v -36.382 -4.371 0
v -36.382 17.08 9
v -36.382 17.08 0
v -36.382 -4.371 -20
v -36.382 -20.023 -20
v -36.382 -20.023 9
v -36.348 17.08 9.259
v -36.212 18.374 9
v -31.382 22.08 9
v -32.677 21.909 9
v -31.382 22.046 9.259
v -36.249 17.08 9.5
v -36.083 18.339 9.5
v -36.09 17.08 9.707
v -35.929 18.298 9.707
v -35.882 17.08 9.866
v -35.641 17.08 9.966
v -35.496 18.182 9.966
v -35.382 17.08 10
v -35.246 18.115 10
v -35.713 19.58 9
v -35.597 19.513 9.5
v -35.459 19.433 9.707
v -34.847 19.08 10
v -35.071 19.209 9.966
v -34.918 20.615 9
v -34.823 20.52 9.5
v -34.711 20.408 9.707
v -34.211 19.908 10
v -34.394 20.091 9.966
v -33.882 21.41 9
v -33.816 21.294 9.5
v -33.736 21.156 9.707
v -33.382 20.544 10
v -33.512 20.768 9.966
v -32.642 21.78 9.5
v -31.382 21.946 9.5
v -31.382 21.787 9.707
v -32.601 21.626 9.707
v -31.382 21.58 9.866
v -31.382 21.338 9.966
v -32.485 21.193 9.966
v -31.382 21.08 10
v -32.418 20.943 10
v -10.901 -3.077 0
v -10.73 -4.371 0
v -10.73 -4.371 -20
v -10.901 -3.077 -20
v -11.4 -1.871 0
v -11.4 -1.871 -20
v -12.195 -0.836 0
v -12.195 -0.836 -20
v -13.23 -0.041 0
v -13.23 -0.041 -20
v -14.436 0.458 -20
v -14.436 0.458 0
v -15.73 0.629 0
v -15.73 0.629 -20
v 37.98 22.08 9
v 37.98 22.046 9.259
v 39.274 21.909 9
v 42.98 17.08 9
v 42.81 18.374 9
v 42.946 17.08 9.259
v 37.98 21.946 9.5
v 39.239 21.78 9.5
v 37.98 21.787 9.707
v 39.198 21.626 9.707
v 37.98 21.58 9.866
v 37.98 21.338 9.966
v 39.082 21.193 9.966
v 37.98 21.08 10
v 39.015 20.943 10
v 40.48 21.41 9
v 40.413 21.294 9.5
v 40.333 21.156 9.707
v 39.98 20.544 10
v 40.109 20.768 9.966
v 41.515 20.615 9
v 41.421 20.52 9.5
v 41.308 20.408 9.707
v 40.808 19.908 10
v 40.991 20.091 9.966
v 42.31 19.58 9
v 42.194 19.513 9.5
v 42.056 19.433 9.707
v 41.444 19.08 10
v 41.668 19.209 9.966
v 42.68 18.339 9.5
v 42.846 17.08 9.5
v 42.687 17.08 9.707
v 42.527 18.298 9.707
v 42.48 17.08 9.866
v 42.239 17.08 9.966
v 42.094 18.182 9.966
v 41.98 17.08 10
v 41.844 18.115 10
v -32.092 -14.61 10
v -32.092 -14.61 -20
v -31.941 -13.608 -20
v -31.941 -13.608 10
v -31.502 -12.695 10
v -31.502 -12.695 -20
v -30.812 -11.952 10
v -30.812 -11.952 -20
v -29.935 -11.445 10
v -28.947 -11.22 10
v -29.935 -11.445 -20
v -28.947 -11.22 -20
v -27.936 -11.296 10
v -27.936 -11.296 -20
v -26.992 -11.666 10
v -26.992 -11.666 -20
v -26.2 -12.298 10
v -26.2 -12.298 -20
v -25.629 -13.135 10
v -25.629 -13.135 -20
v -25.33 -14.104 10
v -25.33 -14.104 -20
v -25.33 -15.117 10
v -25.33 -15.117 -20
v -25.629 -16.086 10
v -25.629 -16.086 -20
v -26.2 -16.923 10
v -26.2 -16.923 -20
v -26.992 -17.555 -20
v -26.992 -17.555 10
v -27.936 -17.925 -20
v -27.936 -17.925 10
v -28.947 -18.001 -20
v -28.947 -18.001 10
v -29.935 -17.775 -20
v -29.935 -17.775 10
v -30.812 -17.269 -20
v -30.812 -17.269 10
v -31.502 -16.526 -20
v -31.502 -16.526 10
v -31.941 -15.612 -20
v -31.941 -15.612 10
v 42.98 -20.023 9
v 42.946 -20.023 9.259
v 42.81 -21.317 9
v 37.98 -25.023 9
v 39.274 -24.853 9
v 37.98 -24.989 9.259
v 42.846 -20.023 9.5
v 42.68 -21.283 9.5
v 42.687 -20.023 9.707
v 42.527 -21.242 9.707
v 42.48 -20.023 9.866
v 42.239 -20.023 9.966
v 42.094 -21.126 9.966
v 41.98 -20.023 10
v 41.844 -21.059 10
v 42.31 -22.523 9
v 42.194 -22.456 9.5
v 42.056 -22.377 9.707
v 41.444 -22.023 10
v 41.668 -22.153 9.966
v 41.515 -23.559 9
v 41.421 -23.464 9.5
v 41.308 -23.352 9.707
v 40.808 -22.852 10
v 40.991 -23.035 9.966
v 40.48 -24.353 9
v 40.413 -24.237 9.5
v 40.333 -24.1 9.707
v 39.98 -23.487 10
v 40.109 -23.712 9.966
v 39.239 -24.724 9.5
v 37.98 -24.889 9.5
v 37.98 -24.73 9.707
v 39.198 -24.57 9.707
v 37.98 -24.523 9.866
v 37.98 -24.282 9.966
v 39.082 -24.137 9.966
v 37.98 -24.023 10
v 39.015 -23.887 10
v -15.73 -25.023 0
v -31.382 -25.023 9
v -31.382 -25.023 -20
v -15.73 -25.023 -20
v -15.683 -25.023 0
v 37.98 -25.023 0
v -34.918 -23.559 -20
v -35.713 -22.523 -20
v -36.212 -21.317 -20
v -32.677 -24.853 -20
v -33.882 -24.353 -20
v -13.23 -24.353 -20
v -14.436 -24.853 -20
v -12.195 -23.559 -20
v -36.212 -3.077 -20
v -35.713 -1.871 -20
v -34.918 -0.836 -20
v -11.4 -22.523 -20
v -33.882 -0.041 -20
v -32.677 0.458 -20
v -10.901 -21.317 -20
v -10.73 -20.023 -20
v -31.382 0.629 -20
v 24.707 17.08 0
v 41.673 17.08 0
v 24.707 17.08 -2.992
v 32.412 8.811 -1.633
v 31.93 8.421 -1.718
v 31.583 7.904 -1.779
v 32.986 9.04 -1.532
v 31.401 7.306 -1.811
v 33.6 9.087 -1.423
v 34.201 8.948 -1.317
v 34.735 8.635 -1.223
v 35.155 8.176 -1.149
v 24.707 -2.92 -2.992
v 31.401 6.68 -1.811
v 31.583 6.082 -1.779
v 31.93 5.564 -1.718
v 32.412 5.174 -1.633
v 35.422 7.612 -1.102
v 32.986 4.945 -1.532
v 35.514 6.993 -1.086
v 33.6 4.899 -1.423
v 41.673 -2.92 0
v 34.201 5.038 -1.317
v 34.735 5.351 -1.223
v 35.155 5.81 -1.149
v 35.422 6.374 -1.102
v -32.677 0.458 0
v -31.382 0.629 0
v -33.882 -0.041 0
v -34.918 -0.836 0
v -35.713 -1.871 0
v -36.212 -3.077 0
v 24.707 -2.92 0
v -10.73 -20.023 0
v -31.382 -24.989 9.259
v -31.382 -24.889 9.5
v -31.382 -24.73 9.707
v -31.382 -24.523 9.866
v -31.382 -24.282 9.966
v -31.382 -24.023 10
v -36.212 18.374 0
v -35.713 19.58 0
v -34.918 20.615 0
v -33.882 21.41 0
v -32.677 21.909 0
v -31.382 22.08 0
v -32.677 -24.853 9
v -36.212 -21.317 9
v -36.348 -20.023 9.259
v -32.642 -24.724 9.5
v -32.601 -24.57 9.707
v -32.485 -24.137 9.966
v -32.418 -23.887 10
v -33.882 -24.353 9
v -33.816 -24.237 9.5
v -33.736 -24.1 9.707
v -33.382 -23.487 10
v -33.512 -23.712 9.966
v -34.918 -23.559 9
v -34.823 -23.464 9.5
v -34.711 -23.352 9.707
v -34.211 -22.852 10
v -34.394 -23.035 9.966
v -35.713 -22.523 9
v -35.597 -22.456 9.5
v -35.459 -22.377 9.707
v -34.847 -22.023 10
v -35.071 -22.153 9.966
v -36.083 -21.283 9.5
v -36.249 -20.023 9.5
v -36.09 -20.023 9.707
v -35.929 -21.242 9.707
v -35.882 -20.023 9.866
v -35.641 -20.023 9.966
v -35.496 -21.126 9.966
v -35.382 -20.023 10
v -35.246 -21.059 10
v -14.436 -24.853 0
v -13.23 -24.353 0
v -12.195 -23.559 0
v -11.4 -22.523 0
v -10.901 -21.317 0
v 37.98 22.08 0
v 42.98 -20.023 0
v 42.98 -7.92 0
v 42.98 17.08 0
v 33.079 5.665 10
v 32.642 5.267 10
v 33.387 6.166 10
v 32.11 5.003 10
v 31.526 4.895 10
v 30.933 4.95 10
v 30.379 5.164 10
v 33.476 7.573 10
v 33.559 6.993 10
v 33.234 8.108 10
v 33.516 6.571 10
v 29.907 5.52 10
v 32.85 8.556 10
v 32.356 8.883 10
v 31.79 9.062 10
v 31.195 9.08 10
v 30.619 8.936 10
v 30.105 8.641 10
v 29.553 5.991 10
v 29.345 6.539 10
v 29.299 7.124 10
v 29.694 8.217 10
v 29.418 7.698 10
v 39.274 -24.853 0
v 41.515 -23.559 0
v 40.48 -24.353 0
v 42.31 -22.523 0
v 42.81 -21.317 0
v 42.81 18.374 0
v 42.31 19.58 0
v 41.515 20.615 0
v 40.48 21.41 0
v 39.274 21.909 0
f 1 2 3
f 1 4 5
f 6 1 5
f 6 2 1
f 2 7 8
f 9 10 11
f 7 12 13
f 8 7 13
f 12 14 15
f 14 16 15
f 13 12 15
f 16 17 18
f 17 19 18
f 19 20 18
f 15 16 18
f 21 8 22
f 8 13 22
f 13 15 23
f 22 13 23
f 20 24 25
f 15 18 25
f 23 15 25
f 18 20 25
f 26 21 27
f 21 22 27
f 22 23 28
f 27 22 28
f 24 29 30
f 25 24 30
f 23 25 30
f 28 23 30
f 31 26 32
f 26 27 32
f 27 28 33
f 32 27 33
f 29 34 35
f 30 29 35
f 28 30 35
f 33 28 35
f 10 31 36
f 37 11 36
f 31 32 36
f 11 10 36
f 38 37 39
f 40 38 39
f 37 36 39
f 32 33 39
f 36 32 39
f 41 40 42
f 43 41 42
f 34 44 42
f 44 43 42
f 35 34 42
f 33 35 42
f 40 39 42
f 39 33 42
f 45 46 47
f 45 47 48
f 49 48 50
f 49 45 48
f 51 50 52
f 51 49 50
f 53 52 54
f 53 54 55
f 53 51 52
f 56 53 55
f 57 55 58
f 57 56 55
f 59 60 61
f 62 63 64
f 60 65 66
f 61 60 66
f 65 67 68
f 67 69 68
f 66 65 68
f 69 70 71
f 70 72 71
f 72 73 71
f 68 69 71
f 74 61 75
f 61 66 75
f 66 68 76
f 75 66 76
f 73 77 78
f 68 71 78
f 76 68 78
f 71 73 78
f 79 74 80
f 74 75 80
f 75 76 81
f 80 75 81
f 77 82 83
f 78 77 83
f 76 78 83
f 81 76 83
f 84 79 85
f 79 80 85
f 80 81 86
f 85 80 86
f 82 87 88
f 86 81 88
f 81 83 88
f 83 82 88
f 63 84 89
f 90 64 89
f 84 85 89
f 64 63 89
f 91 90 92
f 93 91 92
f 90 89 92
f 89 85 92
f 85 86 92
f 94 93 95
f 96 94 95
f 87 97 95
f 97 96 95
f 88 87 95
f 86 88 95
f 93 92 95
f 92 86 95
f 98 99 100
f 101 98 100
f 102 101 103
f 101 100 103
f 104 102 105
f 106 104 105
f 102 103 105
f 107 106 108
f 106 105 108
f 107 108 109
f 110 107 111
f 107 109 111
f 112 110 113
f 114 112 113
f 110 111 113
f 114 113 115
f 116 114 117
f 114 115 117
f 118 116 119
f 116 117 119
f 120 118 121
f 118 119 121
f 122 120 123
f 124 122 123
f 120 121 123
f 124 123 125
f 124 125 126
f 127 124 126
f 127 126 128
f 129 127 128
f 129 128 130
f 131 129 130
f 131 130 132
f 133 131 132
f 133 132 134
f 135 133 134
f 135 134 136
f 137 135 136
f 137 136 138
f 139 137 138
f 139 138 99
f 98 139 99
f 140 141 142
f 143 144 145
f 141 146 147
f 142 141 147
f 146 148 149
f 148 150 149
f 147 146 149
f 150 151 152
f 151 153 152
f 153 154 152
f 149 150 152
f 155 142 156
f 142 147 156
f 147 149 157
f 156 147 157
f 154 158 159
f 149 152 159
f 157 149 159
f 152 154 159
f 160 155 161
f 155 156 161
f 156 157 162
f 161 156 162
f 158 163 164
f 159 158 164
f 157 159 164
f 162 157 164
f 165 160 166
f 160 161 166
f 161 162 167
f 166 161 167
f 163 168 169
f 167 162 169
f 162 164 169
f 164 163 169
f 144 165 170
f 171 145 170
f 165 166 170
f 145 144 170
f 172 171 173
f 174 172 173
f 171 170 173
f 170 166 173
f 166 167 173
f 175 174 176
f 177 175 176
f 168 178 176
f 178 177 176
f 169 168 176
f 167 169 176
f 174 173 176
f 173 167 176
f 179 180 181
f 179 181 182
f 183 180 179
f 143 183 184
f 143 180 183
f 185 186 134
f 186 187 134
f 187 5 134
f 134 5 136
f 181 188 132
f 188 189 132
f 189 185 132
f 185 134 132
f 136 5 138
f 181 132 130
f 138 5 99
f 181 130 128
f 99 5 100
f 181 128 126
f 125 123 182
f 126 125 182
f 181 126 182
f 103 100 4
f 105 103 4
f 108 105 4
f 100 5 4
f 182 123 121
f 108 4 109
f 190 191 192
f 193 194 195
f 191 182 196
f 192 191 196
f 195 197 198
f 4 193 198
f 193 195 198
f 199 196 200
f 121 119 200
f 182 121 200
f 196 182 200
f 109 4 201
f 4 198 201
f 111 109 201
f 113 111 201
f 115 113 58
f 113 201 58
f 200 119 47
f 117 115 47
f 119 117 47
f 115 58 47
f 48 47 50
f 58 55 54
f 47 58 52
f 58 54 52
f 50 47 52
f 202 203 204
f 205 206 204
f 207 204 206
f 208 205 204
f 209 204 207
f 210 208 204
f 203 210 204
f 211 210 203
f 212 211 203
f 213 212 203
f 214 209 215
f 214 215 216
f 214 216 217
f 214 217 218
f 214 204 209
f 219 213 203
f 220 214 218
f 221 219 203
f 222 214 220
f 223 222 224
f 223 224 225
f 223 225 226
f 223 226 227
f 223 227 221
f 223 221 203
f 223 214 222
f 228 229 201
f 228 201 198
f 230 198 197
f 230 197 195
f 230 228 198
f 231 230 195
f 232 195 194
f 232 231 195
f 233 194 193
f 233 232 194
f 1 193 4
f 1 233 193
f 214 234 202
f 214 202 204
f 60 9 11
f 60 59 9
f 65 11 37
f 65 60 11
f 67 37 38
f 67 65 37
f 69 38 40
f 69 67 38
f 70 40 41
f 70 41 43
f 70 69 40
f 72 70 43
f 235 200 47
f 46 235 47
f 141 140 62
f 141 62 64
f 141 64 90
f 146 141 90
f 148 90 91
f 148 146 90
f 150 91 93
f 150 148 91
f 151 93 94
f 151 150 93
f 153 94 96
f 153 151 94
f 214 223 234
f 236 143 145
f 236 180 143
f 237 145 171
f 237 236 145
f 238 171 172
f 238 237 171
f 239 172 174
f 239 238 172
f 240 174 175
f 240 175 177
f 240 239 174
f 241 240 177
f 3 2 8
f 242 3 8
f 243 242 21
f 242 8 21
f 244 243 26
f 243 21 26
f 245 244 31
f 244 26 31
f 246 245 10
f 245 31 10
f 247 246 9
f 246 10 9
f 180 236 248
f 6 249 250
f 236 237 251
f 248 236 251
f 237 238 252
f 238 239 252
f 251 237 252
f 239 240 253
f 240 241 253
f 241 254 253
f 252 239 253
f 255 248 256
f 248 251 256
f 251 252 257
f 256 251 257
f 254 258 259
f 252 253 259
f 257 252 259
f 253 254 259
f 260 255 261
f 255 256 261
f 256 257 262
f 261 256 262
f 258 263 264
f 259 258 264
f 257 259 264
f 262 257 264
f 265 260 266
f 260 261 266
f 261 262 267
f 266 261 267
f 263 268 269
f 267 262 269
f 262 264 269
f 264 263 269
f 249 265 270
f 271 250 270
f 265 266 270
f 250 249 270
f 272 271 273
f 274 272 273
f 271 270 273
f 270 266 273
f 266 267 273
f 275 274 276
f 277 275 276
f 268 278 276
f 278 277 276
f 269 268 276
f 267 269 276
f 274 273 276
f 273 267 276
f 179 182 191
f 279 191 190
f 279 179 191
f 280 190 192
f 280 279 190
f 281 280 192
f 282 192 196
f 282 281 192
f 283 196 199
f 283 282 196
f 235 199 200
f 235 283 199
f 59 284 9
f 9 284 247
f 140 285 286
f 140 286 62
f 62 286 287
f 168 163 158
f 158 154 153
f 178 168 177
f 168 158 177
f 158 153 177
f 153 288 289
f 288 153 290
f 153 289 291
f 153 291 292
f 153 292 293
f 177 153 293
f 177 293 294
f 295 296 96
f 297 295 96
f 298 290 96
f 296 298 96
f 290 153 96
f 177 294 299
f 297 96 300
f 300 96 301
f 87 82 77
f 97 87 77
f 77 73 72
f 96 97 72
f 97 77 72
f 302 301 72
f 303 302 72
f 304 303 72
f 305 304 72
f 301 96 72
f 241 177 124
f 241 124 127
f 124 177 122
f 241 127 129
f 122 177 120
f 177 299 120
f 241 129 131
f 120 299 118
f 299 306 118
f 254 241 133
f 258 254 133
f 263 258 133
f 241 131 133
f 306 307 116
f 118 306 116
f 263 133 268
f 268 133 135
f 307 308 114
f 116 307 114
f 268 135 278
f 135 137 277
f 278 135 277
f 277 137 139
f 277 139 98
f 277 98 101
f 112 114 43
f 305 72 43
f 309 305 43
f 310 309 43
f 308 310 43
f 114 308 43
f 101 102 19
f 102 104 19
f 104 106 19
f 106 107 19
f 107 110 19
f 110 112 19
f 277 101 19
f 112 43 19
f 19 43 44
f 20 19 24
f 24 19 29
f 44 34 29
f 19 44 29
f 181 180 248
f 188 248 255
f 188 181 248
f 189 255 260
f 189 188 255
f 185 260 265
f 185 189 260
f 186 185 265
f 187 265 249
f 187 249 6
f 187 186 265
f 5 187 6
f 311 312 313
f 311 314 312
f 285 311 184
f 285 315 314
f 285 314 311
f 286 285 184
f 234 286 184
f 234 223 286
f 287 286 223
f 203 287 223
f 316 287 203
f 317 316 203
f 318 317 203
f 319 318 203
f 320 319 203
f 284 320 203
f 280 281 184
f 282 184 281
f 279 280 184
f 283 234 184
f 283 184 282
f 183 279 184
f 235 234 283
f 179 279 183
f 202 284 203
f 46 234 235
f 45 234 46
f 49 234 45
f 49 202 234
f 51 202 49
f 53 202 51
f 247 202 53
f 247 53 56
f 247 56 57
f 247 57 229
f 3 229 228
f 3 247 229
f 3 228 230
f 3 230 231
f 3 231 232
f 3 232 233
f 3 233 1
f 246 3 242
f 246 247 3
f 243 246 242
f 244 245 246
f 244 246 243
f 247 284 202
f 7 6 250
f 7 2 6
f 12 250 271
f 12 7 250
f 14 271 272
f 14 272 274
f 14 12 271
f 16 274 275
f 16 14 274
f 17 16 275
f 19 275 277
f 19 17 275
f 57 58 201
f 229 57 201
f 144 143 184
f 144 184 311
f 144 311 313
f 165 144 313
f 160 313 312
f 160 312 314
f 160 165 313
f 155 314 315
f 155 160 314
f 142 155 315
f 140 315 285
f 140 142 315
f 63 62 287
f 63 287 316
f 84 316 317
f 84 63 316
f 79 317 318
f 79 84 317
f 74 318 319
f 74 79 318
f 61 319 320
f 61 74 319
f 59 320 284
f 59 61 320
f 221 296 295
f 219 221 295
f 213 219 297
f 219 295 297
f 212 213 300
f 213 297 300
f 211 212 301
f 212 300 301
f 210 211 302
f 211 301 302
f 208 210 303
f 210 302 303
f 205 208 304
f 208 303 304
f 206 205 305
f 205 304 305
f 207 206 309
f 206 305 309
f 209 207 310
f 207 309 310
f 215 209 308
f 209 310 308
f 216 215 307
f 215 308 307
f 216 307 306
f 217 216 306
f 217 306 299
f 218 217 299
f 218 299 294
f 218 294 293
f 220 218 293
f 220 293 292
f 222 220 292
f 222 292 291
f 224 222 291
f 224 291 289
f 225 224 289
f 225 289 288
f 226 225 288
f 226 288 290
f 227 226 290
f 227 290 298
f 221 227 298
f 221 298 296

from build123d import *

# Parameters (mm, degrees)
SKETCH1_W           = 43.699940619
SKETCH1_H           = 33.102984907
BOSS_EXTRUDE1_DEPTH = 10
BOSS_EXTRUDE2_DEPTH = 10
M3_TAPPED_HOLE1_D   = 4.2
SKETCH15_W          = 10
SKETCH15_H          = 17.102984907
SKETCH15_W_2        = 13
SKETCH15_H_2        = 47.102984907
CUT_EXTRUDE1_DEPTH  = 10
SKETCH18_W          = 58.662437665
SKETCH18_H          = 17.102984907
BOSS_EXTRUDE4_DEPTH = 10
BOSS_EXTRUDE5_DEPTH = 20
M8_TAPPED_HOLE2_D   = 6.8
FILLET1_R           = 5
FILLET2_R           = 1


with BuildPart() as part:
    # Sketch1 → Boss-Extrude1 (new body)
    with BuildSketch(Plane.XY):
        Polygon((42.979890311, 22.079670103), (-49.382487973, 22.079670103), (-49.382487973, -7.920329897), (-5.682547354, -7.920329897), (42.979890311, -7.920329897), align=None)
        with Locations((-27.532517664, -24.471822351)):
            Rectangle(SKETCH1_W, SKETCH1_H)
    extrude(amount=BOSS_EXTRUDE1_DEPTH)

    # Sketch10 → Boss-Extrude2 (add, symmetric)
    with BuildSketch(Plane(origin=(0, 7.079670103, 0), x_dir=(-1, 0, 0), z_dir=(0, -1, 0))):
        Polygon((-41.673127971, 0), (-24.707127971, 0), (-24.707127971, 2.991563555), align=None)
    extrude(amount=BOSS_EXTRUDE2_DEPTH, both=True)

    # M3 Tapped Hole1 (through all)
    with Locations(Plane(origin=(33.44592172, 6.992687386, -1.450678438), x_dir=(-0.984807753012, 0, -0.173648177667), z_dir=(0.173648177667, 0, -0.984807753012))):
        with Locations((0, 0)):
            Hole(M3_TAPPED_HOLE1_D / 2)

    # Sketch15 → Cut-Extrude1 (cut)
    with BuildSketch(Plane(origin=(0, 0, 0), x_dir=(-1, 0, 0), z_dir=(0, 0, -1))):
        Polygon((5.682547354, -25.023314804), (5.682547354, -41.023314804), (49.382487973, -41.023314804), (49.382487973, -25.023314804), (36.382487973, -25.023314804), (15.682547354, -25.023314804), align=None)
        with Locations((10.682547354, -16.471822351)):
            Rectangle(SKETCH15_W, SKETCH15_H)
        with Locations((42.882487973, -1.471822351)):
            Rectangle(SKETCH15_W_2, SKETCH15_H_2)
    extrude(amount=-CUT_EXTRUDE1_DEPTH, mode=Mode.SUBTRACT)

    # Sketch18 → Boss-Extrude4 (add)
    with BuildSketch(Plane(origin=(0, 0, 0), x_dir=(-1, 0, 0), z_dir=(0, 0, -1))):
        with Locations((-13.648671479, -16.471822351)):
            Rectangle(SKETCH18_W, SKETCH18_H)
    extrude(amount=-BOSS_EXTRUDE4_DEPTH)

    # Sketch19 → Boss-Extrude5 (add)
    with BuildSketch(Plane(origin=(0, 0, 0), x_dir=(-1, 0, 0), z_dir=(0, 0, -1))):
        with BuildLine():
            Line((36.382487973, -25.023314804), (15.730487973, -25.023314804))
            ThreePointArc((15.730487973, -25.023314804), (12.194954067, -23.55884871), (10.730487973, -20.023314804))
            Line((10.730487973, -20.023314804), (10.730487973, -4.371314804))
            ThreePointArc((10.730487973, -4.371314804), (12.194954067, -0.835780898), (15.730487973, 0.628685196))
            Line((15.730487973, 0.628685196), (31.382487973, 0.628685196))
            ThreePointArc((31.382487973, 0.628685196), (34.918021878, -0.835780898), (36.382487973, -4.371314804))
            Line((36.382487973, -4.371314804), (36.382487973, -25.023314804))
        make_face()
    extrude(amount=BOSS_EXTRUDE5_DEPTH)

    # M8 Tapped Hole2 (through all)
    with Locations(Plane(origin=(-28.692487973, -14.610329897, 10), x_dir=(1, 0, 0), z_dir=(0, 0, 1))):
        with Locations((0, 0)):
            Hole(M8_TAPPED_HOLE2_D / 2)

    # Fillet1
    fillet1_edges = [part.edges().sort_by_distance(p)[0] for p in [
        (-36.382487973, -25.023314804, -5),
        (-36.382487973, 22.079670103, 5),
        (42.979890311, -25.023314804, 5),
        (42.979890311, 22.079670103, 5),
    ]]
    fillet(fillet1_edges, radius=FILLET1_R)

    # Fillet2
    fillet2_edges = [part.edges().sort_by_distance(p)[0] for p in [
        (-36.382487973, -1.471822351, 10),
        (3.298701169, 22.079670103, 10),
        (3.298701169, -25.023314804, 10),
        (42.979890311, -1.471822351, 10),
        (-34.918021878, -23.55884871, 10),
        (41.515424217, -23.55884871, 10),
        (41.515424217, 20.615204009, 10),
        (-34.918021878, 20.615204009, 10),
    ]]
    fillet(fillet2_edges, radius=FILLET2_R)


solid = part.part
